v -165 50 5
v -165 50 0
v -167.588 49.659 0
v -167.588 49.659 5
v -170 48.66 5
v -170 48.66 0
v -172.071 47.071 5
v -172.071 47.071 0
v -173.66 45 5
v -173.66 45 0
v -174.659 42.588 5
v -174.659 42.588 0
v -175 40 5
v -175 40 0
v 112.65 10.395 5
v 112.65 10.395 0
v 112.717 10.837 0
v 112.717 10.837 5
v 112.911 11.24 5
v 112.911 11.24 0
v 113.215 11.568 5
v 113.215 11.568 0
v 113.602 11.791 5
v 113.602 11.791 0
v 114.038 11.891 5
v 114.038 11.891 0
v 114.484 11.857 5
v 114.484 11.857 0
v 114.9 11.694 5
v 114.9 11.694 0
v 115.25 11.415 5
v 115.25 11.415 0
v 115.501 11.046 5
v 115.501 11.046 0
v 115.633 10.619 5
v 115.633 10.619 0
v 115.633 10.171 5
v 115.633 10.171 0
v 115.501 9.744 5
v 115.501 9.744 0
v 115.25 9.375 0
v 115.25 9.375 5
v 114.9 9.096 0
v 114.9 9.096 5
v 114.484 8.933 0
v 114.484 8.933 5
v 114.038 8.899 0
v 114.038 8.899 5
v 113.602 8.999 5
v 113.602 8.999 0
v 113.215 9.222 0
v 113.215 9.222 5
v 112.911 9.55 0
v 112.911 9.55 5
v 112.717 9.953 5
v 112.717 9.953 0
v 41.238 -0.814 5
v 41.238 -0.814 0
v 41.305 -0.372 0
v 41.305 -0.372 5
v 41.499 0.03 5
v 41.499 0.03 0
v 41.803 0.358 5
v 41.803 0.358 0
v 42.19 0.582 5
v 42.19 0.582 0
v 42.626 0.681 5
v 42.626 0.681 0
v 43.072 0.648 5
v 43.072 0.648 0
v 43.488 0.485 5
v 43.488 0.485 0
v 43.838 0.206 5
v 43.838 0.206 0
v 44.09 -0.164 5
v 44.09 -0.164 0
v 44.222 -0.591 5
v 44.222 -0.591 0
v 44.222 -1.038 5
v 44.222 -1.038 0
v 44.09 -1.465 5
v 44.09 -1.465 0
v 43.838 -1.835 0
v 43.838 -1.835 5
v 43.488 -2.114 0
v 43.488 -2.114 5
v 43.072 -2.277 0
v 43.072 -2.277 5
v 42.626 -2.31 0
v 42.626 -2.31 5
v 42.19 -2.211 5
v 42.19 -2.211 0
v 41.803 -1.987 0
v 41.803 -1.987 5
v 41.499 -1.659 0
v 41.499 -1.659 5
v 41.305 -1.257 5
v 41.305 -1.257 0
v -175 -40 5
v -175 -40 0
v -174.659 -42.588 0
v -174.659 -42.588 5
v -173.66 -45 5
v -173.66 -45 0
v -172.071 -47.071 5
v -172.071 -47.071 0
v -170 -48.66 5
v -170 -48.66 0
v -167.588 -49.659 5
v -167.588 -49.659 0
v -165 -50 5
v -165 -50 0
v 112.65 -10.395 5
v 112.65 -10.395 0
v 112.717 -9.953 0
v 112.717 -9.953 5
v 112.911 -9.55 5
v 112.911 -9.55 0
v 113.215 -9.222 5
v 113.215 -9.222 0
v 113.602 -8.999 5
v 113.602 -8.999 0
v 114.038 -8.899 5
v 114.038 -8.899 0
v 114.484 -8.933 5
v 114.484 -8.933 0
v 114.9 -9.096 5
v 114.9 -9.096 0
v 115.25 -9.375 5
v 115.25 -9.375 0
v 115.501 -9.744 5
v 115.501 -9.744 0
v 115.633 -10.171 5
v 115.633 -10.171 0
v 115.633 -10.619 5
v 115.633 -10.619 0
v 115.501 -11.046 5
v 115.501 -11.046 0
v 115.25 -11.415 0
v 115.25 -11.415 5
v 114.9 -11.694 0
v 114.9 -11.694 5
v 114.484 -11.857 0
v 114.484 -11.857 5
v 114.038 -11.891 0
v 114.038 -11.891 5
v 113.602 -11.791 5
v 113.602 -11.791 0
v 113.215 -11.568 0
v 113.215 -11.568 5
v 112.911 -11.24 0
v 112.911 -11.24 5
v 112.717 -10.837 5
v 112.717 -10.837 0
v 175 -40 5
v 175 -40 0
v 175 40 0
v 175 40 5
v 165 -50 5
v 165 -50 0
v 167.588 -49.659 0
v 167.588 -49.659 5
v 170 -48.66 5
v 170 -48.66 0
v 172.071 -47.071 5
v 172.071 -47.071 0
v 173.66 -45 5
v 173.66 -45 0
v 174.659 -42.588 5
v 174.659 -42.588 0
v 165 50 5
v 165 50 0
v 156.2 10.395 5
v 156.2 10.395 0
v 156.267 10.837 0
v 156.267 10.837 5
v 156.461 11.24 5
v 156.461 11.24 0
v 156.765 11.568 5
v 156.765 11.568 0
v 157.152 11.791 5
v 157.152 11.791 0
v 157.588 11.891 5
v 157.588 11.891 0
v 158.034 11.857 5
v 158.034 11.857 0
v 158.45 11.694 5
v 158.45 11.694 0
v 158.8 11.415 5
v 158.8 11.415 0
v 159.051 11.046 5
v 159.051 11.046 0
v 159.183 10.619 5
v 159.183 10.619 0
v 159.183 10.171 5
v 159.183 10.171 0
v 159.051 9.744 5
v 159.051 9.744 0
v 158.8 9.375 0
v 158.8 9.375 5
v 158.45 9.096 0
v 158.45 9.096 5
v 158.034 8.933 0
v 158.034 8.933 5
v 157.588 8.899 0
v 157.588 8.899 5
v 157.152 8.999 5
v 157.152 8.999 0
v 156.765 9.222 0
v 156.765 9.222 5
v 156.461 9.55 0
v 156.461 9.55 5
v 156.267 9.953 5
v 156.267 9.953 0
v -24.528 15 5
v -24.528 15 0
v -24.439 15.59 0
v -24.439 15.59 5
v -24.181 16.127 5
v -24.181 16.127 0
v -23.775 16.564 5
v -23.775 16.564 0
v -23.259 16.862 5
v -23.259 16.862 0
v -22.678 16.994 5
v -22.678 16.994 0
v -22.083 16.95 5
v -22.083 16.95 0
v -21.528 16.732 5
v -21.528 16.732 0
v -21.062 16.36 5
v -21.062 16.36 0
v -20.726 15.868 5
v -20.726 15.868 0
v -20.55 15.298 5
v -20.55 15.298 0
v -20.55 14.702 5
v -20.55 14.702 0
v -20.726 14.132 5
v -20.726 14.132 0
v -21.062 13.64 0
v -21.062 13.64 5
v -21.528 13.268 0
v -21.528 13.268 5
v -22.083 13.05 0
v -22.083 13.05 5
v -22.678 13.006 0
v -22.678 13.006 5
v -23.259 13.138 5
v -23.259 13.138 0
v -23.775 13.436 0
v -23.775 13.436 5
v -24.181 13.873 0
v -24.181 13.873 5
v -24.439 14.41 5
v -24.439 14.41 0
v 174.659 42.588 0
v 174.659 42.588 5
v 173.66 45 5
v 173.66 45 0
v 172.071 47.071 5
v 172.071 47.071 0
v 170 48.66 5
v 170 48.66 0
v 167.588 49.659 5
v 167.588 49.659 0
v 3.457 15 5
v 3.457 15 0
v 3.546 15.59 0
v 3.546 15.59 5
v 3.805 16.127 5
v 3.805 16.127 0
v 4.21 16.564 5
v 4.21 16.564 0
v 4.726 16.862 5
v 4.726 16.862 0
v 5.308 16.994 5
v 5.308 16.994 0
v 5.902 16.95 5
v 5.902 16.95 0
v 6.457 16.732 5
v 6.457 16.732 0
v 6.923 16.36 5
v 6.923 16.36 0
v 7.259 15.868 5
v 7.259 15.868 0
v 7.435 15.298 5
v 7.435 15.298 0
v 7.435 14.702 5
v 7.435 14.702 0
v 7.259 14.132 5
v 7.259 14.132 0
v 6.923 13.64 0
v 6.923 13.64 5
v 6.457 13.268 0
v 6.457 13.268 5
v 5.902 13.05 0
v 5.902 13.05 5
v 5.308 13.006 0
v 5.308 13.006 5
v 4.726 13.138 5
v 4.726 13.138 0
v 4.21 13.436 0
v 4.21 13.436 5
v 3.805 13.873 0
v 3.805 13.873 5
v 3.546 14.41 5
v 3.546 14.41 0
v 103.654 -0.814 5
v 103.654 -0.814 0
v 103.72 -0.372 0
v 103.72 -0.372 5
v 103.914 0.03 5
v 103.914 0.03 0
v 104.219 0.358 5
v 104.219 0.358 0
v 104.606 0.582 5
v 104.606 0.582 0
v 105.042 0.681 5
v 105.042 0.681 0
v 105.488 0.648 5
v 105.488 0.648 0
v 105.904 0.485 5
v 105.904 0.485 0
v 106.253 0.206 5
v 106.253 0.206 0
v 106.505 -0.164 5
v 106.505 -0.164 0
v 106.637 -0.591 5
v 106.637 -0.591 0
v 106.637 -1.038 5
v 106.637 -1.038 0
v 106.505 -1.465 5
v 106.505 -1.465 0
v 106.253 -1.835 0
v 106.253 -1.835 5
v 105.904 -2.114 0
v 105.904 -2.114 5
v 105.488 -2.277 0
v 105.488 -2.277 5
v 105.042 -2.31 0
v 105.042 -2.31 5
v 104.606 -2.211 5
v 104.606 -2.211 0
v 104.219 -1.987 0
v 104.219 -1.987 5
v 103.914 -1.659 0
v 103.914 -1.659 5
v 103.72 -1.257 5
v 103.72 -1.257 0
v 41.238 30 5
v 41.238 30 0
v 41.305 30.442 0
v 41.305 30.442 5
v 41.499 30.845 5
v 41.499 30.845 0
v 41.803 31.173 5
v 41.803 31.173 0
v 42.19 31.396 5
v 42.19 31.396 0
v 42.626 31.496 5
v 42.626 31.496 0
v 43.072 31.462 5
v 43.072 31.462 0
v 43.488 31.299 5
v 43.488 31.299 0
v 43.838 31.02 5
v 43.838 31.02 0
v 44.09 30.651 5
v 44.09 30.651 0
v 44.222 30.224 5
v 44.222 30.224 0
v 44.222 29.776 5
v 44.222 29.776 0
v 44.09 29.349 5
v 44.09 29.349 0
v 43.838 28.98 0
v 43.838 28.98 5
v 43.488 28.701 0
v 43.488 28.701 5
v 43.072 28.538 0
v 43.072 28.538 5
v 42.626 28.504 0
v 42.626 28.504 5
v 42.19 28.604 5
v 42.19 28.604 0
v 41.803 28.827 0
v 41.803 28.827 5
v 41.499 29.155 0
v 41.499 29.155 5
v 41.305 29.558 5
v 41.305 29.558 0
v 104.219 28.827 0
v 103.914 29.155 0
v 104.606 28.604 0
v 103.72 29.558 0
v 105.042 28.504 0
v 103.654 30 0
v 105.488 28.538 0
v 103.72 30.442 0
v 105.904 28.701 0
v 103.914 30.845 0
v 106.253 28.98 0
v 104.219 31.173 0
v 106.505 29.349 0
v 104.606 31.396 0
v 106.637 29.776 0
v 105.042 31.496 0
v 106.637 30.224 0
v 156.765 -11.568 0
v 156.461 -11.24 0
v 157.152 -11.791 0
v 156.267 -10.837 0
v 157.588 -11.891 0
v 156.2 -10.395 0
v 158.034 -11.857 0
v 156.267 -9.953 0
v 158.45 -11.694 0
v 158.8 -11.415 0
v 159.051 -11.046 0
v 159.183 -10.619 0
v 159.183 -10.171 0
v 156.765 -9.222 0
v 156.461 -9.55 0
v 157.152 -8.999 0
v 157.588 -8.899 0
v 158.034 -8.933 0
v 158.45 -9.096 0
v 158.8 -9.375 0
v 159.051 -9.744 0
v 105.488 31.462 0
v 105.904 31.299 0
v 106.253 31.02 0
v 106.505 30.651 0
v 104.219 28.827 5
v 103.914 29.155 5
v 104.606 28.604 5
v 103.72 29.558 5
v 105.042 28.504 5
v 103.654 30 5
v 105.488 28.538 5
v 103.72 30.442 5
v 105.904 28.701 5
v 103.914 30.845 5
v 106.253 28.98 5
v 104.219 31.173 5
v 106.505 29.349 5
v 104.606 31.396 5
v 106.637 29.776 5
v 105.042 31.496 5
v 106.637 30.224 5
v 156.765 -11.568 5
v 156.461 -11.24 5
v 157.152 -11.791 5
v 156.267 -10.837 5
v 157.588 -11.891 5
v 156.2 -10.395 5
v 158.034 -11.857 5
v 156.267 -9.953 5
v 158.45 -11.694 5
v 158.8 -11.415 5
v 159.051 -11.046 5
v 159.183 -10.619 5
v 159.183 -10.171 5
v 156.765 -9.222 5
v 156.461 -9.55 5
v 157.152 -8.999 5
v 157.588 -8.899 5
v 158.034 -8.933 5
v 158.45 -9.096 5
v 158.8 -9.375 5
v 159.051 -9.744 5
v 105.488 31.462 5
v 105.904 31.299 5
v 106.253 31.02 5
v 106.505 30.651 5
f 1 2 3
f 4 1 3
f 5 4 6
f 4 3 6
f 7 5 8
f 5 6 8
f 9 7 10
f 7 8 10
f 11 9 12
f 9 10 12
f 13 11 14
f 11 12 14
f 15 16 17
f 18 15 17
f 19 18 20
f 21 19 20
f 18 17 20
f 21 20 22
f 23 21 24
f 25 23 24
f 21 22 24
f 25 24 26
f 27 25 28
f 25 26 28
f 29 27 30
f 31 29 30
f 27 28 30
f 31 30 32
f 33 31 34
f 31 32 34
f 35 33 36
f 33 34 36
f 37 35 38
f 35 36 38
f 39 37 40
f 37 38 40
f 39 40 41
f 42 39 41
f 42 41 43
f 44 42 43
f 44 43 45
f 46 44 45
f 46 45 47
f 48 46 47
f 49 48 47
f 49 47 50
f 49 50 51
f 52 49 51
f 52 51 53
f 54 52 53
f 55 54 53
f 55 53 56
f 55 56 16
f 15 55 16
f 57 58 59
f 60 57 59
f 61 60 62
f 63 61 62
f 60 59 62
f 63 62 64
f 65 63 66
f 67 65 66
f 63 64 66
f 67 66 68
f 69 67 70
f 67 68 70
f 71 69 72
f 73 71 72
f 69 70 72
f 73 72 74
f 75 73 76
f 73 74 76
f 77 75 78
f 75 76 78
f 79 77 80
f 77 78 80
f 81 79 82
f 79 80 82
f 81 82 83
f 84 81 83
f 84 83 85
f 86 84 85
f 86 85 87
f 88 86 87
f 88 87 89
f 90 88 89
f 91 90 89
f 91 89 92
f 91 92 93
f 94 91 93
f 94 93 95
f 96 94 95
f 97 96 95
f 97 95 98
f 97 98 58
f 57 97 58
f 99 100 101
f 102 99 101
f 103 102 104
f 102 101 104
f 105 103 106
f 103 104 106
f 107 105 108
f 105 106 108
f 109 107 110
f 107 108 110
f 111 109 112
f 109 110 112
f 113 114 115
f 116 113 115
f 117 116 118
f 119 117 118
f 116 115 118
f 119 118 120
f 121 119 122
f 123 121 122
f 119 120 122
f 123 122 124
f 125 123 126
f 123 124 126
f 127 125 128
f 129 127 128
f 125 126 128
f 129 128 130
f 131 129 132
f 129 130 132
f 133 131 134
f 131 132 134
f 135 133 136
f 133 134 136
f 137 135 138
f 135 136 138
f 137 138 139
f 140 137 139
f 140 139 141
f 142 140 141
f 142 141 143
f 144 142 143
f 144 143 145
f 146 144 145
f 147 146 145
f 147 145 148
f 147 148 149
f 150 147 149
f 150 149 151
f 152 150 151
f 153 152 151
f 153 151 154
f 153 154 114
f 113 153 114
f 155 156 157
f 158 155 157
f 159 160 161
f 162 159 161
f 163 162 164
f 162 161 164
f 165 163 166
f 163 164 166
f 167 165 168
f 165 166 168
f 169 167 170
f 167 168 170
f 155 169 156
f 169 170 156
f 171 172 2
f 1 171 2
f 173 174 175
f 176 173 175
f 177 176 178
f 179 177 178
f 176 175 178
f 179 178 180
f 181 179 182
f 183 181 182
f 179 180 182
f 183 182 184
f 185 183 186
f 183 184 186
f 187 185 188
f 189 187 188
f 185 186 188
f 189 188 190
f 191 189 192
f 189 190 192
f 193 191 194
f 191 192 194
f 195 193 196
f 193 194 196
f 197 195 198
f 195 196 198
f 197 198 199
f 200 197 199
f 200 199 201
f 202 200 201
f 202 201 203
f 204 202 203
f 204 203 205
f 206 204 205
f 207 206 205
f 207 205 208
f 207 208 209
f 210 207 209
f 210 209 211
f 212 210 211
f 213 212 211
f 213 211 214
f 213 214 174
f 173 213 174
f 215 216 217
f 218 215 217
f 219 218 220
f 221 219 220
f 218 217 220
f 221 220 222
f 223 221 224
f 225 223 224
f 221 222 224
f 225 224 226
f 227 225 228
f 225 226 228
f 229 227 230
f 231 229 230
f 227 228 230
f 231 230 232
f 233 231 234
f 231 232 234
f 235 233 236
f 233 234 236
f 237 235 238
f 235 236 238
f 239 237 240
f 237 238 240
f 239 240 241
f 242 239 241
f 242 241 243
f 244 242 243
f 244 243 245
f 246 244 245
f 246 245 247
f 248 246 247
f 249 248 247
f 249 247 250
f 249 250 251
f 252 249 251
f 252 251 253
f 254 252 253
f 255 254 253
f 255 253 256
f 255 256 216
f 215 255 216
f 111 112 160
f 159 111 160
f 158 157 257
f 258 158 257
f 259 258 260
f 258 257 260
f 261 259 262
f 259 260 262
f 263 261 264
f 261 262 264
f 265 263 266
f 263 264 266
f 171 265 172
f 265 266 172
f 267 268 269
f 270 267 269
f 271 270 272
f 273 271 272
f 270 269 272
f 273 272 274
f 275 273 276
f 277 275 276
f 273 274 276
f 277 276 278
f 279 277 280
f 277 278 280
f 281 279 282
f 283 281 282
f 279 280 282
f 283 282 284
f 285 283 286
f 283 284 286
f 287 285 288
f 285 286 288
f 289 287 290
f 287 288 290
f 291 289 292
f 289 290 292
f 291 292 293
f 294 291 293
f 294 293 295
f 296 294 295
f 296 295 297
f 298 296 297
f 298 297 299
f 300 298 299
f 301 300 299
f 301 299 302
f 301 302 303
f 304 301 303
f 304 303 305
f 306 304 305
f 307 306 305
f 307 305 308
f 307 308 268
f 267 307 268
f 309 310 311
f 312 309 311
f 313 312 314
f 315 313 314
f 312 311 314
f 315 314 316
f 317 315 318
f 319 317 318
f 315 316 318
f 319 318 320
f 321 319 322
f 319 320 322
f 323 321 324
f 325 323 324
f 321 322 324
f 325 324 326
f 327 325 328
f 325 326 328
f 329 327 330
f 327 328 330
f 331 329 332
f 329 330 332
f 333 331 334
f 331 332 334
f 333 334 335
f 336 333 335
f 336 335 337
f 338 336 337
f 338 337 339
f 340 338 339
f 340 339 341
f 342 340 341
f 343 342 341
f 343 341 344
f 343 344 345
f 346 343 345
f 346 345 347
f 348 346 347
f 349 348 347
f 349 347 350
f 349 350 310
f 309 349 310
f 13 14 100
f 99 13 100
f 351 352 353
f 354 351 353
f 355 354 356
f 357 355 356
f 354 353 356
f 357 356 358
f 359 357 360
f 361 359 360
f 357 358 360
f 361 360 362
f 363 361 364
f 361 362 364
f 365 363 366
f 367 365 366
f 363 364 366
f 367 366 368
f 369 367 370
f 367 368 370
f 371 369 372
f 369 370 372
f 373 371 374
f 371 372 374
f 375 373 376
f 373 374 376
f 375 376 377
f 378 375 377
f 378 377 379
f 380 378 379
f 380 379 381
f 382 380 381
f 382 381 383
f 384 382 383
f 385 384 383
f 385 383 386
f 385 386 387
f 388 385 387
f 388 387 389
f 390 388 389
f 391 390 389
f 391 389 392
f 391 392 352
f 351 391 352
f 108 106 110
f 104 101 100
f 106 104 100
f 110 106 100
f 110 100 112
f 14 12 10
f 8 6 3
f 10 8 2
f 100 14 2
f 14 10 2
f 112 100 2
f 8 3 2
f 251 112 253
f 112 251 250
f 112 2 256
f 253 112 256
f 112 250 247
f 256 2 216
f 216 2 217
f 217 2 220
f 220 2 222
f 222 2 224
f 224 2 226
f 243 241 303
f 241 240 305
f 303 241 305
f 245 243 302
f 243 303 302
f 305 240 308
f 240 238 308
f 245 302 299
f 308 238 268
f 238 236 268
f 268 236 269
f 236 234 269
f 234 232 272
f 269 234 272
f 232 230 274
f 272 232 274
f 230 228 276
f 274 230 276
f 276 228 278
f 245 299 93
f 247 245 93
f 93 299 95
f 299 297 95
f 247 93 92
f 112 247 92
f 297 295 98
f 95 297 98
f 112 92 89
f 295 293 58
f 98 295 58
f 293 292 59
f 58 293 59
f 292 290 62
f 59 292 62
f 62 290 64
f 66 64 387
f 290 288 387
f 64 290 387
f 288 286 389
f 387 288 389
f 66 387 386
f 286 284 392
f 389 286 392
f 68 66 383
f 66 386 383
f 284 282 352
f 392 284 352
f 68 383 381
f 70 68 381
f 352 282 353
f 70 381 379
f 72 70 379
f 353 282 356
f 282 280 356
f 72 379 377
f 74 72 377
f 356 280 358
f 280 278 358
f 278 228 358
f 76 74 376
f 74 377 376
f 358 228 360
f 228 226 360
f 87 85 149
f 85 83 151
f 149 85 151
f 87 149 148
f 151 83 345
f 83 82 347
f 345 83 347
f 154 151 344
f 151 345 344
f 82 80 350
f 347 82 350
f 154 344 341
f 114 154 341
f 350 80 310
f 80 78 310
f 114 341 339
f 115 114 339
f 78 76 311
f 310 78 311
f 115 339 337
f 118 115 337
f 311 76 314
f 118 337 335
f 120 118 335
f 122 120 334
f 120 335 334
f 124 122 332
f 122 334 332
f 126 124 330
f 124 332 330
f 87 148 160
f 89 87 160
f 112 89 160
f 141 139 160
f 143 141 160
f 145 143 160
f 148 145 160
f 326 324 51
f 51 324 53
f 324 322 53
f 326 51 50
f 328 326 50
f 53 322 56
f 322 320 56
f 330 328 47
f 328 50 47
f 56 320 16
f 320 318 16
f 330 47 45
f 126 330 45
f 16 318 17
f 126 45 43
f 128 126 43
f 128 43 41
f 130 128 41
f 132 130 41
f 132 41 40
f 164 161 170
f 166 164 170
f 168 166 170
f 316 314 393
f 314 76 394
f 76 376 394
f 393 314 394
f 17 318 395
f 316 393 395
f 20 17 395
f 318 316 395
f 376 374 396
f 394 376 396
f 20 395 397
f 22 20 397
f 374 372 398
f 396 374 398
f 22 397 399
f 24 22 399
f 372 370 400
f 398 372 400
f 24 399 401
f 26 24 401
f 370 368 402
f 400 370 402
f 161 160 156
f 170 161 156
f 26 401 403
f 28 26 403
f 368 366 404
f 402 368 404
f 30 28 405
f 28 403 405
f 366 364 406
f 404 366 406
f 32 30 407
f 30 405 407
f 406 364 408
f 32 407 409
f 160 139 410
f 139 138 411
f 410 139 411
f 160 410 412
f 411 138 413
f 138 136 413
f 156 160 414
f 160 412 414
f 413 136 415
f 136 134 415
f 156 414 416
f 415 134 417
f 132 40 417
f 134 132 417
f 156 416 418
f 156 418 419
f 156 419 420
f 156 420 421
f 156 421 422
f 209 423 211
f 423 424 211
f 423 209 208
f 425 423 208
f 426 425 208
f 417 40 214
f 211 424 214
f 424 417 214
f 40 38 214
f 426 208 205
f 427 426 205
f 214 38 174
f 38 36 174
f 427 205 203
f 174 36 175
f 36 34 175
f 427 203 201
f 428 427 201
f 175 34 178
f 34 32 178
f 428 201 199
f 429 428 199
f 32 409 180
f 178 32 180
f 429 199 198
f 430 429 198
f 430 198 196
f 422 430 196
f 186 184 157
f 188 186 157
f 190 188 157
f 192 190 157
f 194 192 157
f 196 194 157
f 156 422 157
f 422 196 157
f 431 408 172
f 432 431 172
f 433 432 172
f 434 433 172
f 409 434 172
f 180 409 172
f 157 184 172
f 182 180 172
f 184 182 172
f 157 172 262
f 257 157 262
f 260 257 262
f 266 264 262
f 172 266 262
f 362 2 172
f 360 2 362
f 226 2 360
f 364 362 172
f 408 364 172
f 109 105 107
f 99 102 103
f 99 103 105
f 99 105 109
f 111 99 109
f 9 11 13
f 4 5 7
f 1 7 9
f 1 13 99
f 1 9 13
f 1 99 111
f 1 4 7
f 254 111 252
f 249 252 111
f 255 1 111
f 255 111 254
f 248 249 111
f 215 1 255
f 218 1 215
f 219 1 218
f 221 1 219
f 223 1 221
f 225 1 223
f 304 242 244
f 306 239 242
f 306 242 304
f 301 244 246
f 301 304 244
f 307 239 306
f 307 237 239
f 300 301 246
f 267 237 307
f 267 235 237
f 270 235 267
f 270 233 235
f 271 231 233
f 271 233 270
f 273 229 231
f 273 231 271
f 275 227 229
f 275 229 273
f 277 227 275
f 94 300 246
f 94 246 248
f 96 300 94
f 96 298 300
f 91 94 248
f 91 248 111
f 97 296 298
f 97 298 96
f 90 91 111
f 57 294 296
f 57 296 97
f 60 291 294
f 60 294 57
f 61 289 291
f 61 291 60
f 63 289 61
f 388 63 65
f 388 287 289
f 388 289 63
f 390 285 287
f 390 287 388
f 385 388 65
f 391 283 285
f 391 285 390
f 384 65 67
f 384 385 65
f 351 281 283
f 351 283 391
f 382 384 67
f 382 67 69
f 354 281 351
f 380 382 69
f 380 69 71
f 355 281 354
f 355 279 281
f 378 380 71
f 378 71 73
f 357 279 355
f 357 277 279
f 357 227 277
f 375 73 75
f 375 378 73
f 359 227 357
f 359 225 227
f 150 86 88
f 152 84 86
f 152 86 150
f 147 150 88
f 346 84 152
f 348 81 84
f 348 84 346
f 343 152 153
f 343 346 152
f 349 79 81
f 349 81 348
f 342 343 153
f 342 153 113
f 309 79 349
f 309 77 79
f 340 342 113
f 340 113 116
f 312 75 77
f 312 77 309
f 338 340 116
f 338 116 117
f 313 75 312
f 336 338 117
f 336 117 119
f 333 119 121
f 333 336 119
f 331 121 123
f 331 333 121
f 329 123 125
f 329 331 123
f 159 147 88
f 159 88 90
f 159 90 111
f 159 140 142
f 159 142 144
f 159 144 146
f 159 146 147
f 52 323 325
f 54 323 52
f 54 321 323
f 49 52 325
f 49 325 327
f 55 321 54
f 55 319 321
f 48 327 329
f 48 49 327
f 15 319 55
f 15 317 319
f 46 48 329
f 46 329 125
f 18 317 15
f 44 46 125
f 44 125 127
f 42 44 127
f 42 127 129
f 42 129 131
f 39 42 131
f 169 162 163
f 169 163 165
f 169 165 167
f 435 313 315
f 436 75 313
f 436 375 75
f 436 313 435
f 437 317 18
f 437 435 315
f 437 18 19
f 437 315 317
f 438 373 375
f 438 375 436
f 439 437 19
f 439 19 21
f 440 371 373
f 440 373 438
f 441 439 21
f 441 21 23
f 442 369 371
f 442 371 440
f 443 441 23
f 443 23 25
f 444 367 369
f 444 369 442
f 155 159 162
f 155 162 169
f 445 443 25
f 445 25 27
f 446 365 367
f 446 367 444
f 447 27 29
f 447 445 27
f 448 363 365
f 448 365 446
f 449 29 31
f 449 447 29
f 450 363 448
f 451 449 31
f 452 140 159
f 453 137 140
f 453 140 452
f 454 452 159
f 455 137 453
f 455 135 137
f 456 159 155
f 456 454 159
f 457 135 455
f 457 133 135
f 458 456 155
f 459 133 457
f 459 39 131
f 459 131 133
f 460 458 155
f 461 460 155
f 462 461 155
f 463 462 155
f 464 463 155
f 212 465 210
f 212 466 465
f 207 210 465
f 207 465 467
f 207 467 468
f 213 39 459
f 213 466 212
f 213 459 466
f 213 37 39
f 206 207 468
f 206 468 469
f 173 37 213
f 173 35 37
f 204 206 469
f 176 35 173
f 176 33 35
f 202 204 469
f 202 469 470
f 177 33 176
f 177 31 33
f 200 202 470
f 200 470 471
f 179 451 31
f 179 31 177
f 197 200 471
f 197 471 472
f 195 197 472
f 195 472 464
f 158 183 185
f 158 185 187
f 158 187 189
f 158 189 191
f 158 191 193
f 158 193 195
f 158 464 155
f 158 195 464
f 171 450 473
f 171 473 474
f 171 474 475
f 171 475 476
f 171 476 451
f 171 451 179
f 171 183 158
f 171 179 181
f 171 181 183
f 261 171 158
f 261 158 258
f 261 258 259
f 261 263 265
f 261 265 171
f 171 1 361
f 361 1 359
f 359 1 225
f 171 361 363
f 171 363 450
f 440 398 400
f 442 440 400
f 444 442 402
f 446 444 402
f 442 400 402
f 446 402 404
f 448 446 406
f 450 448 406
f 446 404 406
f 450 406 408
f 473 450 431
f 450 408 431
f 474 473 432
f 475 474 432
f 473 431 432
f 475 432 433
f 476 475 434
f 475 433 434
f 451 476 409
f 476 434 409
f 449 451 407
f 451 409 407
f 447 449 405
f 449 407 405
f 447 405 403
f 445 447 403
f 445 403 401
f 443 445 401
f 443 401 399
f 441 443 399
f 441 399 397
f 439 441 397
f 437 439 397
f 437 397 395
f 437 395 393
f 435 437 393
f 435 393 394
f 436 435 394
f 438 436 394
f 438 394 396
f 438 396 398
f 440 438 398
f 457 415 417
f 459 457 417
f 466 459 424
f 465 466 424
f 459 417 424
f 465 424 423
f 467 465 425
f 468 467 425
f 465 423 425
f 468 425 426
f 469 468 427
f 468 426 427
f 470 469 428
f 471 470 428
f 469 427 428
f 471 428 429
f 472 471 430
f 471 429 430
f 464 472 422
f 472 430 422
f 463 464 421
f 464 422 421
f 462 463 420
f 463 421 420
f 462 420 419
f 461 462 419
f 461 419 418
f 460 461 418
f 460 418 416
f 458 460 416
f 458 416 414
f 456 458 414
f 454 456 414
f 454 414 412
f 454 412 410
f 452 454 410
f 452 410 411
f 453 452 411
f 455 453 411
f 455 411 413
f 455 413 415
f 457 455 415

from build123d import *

# Parameters (mm, degrees)
BOSS_EXTRUDE1_DEPTH = 5
CUT_EXTRUDE1_REACH  = 7
SKETCH2_R           = 2
SKETCH2_R_2         = 1.5


with BuildPart() as part:
    # Sketch1 → Boss-Extrude1 (new body)
    with BuildSketch(Plane.XY):
        with BuildLine():
            Line((-165, -50), (165, -50))
            ThreePointArc((165, -50), (172.071067812, -47.071067812), (175, -40))
            Line((175, -40), (175, 40))
            ThreePointArc((175, 40), (172.071067812, 47.071067812), (165, 50))
            Line((165, 50), (-165, 50))
            ThreePointArc((-165, 50), (-172.071067812, 47.071067812), (-175, 40))
            Line((-175, 40), (-175, -40))
            ThreePointArc((-175, -40), (-172.071067812, -47.071067812), (-165, -50))
        make_face()
    extrude(amount=BOSS_EXTRUDE1_DEPTH)

    # Sketch2 → Cut-Extrude1 (cut, up to next)
    with BuildSketch(Plane(origin=(0, 0, 0), x_dir=(-1, 0, 0), z_dir=(0, 0, -1)), mode=Mode.PRIVATE) as cut_extrude1_sk1:
        with Locations((-5.457089812, 15)):
            Circle(SKETCH2_R)
    cut_extrude1_tool1 = extrude(cut_extrude1_sk1.sketch, amount=-CUT_EXTRUDE1_REACH, mode=Mode.PRIVATE) & part.part
    add(cut_extrude1_tool1.solids().sort_by_distance((5.45709, 15, 0))[0], mode=Mode.SUBTRACT)
    # Sketch2 → Cut-Extrude1 (cut, up to next)
    with BuildSketch(Plane(origin=(0, 0, 0), x_dir=(-1, 0, 0), z_dir=(0, 0, -1)), mode=Mode.PRIVATE) as cut_extrude1_sk2:
        with Locations((22.528132313, 15)):
            Circle(SKETCH2_R)
    cut_extrude1_tool2 = extrude(cut_extrude1_sk2.sketch, amount=-CUT_EXTRUDE1_REACH, mode=Mode.PRIVATE) & part.part
    add(cut_extrude1_tool2.solids().sort_by_distance((-22.528132, 15, 0))[0], mode=Mode.SUBTRACT)
    # Sketch2 → Cut-Extrude1 (cut, up to next)
    with BuildSketch(Plane(origin=(0, 0, 0), x_dir=(-1, 0, 0), z_dir=(0, 0, -1)), mode=Mode.PRIVATE) as cut_extrude1_sk3:
        with Locations((-105.153812798, 30)):
            Circle(SKETCH2_R_2)
    cut_extrude1_tool3 = extrude(cut_extrude1_sk3.sketch, amount=-CUT_EXTRUDE1_REACH, mode=Mode.PRIVATE) & part.part
    add(cut_extrude1_tool3.solids().sort_by_distance((105.153813, 30, 0))[0], mode=Mode.SUBTRACT)
    # Sketch2 → Cut-Extrude1 (cut, up to next)
    with BuildSketch(Plane(origin=(0, 0, 0), x_dir=(-1, 0, 0), z_dir=(0, 0, -1)), mode=Mode.PRIVATE) as cut_extrude1_sk4:
        with Locations((-42.738382893, 30)):
            Circle(SKETCH2_R_2)
    cut_extrude1_tool4 = extrude(cut_extrude1_sk4.sketch, amount=-CUT_EXTRUDE1_REACH, mode=Mode.PRIVATE) & part.part
    add(cut_extrude1_tool4.solids().sort_by_distance((42.738383, 30, 0))[0], mode=Mode.SUBTRACT)
    # Sketch2 → Cut-Extrude1 (cut, up to next)
    with BuildSketch(Plane(origin=(0, 0, 0), x_dir=(-1, 0, 0), z_dir=(0, 0, -1)), mode=Mode.PRIVATE) as cut_extrude1_sk5:
        with Locations((-42.738382893, -0.814499844)):
            Circle(SKETCH2_R_2)
    cut_extrude1_tool5 = extrude(cut_extrude1_sk5.sketch, amount=-CUT_EXTRUDE1_REACH, mode=Mode.PRIVATE) & part.part
    add(cut_extrude1_tool5.solids().sort_by_distance((42.738383, -0.8145, 0))[0], mode=Mode.SUBTRACT)
    # Sketch2 → Cut-Extrude1 (cut, up to next)
    with BuildSketch(Plane(origin=(0, 0, 0), x_dir=(-1, 0, 0), z_dir=(0, 0, -1)), mode=Mode.PRIVATE) as cut_extrude1_sk6:
        with Locations((-105.153812798, -0.814499844)):
            Circle(SKETCH2_R_2)
    cut_extrude1_tool6 = extrude(cut_extrude1_sk6.sketch, amount=-CUT_EXTRUDE1_REACH, mode=Mode.PRIVATE) & part.part
    add(cut_extrude1_tool6.solids().sort_by_distance((105.153813, -0.8145, 0))[0], mode=Mode.SUBTRACT)
    # Sketch2 → Cut-Extrude1 (cut, up to next)
    with BuildSketch(Plane(origin=(0, 0, 0), x_dir=(-1, 0, 0), z_dir=(0, 0, -1)), mode=Mode.PRIVATE) as cut_extrude1_sk7:
        with Locations((-114.15, -10.395)):
            Circle(SKETCH2_R_2)
    cut_extrude1_tool7 = extrude(cut_extrude1_sk7.sketch, amount=-CUT_EXTRUDE1_REACH, mode=Mode.PRIVATE) & part.part
    add(cut_extrude1_tool7.solids().sort_by_distance((114.15, -10.395, 0))[0], mode=Mode.SUBTRACT)
    # Sketch2 → Cut-Extrude1 (cut, up to next)
    with BuildSketch(Plane(origin=(0, 0, 0), x_dir=(-1, 0, 0), z_dir=(0, 0, -1)), mode=Mode.PRIVATE) as cut_extrude1_sk8:
        with Locations((-114.15, 10.395)):
            Circle(SKETCH2_R_2)
    cut_extrude1_tool8 = extrude(cut_extrude1_sk8.sketch, amount=-CUT_EXTRUDE1_REACH, mode=Mode.PRIVATE) & part.part
    add(cut_extrude1_tool8.solids().sort_by_distance((114.15, 10.395, 0))[0], mode=Mode.SUBTRACT)
    # Sketch2 → Cut-Extrude1 (cut, up to next)
    with BuildSketch(Plane(origin=(0, 0, 0), x_dir=(-1, 0, 0), z_dir=(0, 0, -1)), mode=Mode.PRIVATE) as cut_extrude1_sk9:
        with Locations((-157.7, -10.395)):
            Circle(SKETCH2_R_2)
    cut_extrude1_tool9 = extrude(cut_extrude1_sk9.sketch, amount=-CUT_EXTRUDE1_REACH, mode=Mode.PRIVATE) & part.part
    add(cut_extrude1_tool9.solids().sort_by_distance((157.7, -10.395, 0))[0], mode=Mode.SUBTRACT)
    # Sketch2 → Cut-Extrude1 (cut, up to next)
    with BuildSketch(Plane(origin=(0, 0, 0), x_dir=(-1, 0, 0), z_dir=(0, 0, -1)), mode=Mode.PRIVATE) as cut_extrude1_sk10:
        with Locations((-157.7, 10.395)):
            Circle(SKETCH2_R_2)
    cut_extrude1_tool10 = extrude(cut_extrude1_sk10.sketch, amount=-CUT_EXTRUDE1_REACH, mode=Mode.PRIVATE) & part.part
    add(cut_extrude1_tool10.solids().sort_by_distance((157.7, 10.395, 0))[0], mode=Mode.SUBTRACT)


solid = part.part
